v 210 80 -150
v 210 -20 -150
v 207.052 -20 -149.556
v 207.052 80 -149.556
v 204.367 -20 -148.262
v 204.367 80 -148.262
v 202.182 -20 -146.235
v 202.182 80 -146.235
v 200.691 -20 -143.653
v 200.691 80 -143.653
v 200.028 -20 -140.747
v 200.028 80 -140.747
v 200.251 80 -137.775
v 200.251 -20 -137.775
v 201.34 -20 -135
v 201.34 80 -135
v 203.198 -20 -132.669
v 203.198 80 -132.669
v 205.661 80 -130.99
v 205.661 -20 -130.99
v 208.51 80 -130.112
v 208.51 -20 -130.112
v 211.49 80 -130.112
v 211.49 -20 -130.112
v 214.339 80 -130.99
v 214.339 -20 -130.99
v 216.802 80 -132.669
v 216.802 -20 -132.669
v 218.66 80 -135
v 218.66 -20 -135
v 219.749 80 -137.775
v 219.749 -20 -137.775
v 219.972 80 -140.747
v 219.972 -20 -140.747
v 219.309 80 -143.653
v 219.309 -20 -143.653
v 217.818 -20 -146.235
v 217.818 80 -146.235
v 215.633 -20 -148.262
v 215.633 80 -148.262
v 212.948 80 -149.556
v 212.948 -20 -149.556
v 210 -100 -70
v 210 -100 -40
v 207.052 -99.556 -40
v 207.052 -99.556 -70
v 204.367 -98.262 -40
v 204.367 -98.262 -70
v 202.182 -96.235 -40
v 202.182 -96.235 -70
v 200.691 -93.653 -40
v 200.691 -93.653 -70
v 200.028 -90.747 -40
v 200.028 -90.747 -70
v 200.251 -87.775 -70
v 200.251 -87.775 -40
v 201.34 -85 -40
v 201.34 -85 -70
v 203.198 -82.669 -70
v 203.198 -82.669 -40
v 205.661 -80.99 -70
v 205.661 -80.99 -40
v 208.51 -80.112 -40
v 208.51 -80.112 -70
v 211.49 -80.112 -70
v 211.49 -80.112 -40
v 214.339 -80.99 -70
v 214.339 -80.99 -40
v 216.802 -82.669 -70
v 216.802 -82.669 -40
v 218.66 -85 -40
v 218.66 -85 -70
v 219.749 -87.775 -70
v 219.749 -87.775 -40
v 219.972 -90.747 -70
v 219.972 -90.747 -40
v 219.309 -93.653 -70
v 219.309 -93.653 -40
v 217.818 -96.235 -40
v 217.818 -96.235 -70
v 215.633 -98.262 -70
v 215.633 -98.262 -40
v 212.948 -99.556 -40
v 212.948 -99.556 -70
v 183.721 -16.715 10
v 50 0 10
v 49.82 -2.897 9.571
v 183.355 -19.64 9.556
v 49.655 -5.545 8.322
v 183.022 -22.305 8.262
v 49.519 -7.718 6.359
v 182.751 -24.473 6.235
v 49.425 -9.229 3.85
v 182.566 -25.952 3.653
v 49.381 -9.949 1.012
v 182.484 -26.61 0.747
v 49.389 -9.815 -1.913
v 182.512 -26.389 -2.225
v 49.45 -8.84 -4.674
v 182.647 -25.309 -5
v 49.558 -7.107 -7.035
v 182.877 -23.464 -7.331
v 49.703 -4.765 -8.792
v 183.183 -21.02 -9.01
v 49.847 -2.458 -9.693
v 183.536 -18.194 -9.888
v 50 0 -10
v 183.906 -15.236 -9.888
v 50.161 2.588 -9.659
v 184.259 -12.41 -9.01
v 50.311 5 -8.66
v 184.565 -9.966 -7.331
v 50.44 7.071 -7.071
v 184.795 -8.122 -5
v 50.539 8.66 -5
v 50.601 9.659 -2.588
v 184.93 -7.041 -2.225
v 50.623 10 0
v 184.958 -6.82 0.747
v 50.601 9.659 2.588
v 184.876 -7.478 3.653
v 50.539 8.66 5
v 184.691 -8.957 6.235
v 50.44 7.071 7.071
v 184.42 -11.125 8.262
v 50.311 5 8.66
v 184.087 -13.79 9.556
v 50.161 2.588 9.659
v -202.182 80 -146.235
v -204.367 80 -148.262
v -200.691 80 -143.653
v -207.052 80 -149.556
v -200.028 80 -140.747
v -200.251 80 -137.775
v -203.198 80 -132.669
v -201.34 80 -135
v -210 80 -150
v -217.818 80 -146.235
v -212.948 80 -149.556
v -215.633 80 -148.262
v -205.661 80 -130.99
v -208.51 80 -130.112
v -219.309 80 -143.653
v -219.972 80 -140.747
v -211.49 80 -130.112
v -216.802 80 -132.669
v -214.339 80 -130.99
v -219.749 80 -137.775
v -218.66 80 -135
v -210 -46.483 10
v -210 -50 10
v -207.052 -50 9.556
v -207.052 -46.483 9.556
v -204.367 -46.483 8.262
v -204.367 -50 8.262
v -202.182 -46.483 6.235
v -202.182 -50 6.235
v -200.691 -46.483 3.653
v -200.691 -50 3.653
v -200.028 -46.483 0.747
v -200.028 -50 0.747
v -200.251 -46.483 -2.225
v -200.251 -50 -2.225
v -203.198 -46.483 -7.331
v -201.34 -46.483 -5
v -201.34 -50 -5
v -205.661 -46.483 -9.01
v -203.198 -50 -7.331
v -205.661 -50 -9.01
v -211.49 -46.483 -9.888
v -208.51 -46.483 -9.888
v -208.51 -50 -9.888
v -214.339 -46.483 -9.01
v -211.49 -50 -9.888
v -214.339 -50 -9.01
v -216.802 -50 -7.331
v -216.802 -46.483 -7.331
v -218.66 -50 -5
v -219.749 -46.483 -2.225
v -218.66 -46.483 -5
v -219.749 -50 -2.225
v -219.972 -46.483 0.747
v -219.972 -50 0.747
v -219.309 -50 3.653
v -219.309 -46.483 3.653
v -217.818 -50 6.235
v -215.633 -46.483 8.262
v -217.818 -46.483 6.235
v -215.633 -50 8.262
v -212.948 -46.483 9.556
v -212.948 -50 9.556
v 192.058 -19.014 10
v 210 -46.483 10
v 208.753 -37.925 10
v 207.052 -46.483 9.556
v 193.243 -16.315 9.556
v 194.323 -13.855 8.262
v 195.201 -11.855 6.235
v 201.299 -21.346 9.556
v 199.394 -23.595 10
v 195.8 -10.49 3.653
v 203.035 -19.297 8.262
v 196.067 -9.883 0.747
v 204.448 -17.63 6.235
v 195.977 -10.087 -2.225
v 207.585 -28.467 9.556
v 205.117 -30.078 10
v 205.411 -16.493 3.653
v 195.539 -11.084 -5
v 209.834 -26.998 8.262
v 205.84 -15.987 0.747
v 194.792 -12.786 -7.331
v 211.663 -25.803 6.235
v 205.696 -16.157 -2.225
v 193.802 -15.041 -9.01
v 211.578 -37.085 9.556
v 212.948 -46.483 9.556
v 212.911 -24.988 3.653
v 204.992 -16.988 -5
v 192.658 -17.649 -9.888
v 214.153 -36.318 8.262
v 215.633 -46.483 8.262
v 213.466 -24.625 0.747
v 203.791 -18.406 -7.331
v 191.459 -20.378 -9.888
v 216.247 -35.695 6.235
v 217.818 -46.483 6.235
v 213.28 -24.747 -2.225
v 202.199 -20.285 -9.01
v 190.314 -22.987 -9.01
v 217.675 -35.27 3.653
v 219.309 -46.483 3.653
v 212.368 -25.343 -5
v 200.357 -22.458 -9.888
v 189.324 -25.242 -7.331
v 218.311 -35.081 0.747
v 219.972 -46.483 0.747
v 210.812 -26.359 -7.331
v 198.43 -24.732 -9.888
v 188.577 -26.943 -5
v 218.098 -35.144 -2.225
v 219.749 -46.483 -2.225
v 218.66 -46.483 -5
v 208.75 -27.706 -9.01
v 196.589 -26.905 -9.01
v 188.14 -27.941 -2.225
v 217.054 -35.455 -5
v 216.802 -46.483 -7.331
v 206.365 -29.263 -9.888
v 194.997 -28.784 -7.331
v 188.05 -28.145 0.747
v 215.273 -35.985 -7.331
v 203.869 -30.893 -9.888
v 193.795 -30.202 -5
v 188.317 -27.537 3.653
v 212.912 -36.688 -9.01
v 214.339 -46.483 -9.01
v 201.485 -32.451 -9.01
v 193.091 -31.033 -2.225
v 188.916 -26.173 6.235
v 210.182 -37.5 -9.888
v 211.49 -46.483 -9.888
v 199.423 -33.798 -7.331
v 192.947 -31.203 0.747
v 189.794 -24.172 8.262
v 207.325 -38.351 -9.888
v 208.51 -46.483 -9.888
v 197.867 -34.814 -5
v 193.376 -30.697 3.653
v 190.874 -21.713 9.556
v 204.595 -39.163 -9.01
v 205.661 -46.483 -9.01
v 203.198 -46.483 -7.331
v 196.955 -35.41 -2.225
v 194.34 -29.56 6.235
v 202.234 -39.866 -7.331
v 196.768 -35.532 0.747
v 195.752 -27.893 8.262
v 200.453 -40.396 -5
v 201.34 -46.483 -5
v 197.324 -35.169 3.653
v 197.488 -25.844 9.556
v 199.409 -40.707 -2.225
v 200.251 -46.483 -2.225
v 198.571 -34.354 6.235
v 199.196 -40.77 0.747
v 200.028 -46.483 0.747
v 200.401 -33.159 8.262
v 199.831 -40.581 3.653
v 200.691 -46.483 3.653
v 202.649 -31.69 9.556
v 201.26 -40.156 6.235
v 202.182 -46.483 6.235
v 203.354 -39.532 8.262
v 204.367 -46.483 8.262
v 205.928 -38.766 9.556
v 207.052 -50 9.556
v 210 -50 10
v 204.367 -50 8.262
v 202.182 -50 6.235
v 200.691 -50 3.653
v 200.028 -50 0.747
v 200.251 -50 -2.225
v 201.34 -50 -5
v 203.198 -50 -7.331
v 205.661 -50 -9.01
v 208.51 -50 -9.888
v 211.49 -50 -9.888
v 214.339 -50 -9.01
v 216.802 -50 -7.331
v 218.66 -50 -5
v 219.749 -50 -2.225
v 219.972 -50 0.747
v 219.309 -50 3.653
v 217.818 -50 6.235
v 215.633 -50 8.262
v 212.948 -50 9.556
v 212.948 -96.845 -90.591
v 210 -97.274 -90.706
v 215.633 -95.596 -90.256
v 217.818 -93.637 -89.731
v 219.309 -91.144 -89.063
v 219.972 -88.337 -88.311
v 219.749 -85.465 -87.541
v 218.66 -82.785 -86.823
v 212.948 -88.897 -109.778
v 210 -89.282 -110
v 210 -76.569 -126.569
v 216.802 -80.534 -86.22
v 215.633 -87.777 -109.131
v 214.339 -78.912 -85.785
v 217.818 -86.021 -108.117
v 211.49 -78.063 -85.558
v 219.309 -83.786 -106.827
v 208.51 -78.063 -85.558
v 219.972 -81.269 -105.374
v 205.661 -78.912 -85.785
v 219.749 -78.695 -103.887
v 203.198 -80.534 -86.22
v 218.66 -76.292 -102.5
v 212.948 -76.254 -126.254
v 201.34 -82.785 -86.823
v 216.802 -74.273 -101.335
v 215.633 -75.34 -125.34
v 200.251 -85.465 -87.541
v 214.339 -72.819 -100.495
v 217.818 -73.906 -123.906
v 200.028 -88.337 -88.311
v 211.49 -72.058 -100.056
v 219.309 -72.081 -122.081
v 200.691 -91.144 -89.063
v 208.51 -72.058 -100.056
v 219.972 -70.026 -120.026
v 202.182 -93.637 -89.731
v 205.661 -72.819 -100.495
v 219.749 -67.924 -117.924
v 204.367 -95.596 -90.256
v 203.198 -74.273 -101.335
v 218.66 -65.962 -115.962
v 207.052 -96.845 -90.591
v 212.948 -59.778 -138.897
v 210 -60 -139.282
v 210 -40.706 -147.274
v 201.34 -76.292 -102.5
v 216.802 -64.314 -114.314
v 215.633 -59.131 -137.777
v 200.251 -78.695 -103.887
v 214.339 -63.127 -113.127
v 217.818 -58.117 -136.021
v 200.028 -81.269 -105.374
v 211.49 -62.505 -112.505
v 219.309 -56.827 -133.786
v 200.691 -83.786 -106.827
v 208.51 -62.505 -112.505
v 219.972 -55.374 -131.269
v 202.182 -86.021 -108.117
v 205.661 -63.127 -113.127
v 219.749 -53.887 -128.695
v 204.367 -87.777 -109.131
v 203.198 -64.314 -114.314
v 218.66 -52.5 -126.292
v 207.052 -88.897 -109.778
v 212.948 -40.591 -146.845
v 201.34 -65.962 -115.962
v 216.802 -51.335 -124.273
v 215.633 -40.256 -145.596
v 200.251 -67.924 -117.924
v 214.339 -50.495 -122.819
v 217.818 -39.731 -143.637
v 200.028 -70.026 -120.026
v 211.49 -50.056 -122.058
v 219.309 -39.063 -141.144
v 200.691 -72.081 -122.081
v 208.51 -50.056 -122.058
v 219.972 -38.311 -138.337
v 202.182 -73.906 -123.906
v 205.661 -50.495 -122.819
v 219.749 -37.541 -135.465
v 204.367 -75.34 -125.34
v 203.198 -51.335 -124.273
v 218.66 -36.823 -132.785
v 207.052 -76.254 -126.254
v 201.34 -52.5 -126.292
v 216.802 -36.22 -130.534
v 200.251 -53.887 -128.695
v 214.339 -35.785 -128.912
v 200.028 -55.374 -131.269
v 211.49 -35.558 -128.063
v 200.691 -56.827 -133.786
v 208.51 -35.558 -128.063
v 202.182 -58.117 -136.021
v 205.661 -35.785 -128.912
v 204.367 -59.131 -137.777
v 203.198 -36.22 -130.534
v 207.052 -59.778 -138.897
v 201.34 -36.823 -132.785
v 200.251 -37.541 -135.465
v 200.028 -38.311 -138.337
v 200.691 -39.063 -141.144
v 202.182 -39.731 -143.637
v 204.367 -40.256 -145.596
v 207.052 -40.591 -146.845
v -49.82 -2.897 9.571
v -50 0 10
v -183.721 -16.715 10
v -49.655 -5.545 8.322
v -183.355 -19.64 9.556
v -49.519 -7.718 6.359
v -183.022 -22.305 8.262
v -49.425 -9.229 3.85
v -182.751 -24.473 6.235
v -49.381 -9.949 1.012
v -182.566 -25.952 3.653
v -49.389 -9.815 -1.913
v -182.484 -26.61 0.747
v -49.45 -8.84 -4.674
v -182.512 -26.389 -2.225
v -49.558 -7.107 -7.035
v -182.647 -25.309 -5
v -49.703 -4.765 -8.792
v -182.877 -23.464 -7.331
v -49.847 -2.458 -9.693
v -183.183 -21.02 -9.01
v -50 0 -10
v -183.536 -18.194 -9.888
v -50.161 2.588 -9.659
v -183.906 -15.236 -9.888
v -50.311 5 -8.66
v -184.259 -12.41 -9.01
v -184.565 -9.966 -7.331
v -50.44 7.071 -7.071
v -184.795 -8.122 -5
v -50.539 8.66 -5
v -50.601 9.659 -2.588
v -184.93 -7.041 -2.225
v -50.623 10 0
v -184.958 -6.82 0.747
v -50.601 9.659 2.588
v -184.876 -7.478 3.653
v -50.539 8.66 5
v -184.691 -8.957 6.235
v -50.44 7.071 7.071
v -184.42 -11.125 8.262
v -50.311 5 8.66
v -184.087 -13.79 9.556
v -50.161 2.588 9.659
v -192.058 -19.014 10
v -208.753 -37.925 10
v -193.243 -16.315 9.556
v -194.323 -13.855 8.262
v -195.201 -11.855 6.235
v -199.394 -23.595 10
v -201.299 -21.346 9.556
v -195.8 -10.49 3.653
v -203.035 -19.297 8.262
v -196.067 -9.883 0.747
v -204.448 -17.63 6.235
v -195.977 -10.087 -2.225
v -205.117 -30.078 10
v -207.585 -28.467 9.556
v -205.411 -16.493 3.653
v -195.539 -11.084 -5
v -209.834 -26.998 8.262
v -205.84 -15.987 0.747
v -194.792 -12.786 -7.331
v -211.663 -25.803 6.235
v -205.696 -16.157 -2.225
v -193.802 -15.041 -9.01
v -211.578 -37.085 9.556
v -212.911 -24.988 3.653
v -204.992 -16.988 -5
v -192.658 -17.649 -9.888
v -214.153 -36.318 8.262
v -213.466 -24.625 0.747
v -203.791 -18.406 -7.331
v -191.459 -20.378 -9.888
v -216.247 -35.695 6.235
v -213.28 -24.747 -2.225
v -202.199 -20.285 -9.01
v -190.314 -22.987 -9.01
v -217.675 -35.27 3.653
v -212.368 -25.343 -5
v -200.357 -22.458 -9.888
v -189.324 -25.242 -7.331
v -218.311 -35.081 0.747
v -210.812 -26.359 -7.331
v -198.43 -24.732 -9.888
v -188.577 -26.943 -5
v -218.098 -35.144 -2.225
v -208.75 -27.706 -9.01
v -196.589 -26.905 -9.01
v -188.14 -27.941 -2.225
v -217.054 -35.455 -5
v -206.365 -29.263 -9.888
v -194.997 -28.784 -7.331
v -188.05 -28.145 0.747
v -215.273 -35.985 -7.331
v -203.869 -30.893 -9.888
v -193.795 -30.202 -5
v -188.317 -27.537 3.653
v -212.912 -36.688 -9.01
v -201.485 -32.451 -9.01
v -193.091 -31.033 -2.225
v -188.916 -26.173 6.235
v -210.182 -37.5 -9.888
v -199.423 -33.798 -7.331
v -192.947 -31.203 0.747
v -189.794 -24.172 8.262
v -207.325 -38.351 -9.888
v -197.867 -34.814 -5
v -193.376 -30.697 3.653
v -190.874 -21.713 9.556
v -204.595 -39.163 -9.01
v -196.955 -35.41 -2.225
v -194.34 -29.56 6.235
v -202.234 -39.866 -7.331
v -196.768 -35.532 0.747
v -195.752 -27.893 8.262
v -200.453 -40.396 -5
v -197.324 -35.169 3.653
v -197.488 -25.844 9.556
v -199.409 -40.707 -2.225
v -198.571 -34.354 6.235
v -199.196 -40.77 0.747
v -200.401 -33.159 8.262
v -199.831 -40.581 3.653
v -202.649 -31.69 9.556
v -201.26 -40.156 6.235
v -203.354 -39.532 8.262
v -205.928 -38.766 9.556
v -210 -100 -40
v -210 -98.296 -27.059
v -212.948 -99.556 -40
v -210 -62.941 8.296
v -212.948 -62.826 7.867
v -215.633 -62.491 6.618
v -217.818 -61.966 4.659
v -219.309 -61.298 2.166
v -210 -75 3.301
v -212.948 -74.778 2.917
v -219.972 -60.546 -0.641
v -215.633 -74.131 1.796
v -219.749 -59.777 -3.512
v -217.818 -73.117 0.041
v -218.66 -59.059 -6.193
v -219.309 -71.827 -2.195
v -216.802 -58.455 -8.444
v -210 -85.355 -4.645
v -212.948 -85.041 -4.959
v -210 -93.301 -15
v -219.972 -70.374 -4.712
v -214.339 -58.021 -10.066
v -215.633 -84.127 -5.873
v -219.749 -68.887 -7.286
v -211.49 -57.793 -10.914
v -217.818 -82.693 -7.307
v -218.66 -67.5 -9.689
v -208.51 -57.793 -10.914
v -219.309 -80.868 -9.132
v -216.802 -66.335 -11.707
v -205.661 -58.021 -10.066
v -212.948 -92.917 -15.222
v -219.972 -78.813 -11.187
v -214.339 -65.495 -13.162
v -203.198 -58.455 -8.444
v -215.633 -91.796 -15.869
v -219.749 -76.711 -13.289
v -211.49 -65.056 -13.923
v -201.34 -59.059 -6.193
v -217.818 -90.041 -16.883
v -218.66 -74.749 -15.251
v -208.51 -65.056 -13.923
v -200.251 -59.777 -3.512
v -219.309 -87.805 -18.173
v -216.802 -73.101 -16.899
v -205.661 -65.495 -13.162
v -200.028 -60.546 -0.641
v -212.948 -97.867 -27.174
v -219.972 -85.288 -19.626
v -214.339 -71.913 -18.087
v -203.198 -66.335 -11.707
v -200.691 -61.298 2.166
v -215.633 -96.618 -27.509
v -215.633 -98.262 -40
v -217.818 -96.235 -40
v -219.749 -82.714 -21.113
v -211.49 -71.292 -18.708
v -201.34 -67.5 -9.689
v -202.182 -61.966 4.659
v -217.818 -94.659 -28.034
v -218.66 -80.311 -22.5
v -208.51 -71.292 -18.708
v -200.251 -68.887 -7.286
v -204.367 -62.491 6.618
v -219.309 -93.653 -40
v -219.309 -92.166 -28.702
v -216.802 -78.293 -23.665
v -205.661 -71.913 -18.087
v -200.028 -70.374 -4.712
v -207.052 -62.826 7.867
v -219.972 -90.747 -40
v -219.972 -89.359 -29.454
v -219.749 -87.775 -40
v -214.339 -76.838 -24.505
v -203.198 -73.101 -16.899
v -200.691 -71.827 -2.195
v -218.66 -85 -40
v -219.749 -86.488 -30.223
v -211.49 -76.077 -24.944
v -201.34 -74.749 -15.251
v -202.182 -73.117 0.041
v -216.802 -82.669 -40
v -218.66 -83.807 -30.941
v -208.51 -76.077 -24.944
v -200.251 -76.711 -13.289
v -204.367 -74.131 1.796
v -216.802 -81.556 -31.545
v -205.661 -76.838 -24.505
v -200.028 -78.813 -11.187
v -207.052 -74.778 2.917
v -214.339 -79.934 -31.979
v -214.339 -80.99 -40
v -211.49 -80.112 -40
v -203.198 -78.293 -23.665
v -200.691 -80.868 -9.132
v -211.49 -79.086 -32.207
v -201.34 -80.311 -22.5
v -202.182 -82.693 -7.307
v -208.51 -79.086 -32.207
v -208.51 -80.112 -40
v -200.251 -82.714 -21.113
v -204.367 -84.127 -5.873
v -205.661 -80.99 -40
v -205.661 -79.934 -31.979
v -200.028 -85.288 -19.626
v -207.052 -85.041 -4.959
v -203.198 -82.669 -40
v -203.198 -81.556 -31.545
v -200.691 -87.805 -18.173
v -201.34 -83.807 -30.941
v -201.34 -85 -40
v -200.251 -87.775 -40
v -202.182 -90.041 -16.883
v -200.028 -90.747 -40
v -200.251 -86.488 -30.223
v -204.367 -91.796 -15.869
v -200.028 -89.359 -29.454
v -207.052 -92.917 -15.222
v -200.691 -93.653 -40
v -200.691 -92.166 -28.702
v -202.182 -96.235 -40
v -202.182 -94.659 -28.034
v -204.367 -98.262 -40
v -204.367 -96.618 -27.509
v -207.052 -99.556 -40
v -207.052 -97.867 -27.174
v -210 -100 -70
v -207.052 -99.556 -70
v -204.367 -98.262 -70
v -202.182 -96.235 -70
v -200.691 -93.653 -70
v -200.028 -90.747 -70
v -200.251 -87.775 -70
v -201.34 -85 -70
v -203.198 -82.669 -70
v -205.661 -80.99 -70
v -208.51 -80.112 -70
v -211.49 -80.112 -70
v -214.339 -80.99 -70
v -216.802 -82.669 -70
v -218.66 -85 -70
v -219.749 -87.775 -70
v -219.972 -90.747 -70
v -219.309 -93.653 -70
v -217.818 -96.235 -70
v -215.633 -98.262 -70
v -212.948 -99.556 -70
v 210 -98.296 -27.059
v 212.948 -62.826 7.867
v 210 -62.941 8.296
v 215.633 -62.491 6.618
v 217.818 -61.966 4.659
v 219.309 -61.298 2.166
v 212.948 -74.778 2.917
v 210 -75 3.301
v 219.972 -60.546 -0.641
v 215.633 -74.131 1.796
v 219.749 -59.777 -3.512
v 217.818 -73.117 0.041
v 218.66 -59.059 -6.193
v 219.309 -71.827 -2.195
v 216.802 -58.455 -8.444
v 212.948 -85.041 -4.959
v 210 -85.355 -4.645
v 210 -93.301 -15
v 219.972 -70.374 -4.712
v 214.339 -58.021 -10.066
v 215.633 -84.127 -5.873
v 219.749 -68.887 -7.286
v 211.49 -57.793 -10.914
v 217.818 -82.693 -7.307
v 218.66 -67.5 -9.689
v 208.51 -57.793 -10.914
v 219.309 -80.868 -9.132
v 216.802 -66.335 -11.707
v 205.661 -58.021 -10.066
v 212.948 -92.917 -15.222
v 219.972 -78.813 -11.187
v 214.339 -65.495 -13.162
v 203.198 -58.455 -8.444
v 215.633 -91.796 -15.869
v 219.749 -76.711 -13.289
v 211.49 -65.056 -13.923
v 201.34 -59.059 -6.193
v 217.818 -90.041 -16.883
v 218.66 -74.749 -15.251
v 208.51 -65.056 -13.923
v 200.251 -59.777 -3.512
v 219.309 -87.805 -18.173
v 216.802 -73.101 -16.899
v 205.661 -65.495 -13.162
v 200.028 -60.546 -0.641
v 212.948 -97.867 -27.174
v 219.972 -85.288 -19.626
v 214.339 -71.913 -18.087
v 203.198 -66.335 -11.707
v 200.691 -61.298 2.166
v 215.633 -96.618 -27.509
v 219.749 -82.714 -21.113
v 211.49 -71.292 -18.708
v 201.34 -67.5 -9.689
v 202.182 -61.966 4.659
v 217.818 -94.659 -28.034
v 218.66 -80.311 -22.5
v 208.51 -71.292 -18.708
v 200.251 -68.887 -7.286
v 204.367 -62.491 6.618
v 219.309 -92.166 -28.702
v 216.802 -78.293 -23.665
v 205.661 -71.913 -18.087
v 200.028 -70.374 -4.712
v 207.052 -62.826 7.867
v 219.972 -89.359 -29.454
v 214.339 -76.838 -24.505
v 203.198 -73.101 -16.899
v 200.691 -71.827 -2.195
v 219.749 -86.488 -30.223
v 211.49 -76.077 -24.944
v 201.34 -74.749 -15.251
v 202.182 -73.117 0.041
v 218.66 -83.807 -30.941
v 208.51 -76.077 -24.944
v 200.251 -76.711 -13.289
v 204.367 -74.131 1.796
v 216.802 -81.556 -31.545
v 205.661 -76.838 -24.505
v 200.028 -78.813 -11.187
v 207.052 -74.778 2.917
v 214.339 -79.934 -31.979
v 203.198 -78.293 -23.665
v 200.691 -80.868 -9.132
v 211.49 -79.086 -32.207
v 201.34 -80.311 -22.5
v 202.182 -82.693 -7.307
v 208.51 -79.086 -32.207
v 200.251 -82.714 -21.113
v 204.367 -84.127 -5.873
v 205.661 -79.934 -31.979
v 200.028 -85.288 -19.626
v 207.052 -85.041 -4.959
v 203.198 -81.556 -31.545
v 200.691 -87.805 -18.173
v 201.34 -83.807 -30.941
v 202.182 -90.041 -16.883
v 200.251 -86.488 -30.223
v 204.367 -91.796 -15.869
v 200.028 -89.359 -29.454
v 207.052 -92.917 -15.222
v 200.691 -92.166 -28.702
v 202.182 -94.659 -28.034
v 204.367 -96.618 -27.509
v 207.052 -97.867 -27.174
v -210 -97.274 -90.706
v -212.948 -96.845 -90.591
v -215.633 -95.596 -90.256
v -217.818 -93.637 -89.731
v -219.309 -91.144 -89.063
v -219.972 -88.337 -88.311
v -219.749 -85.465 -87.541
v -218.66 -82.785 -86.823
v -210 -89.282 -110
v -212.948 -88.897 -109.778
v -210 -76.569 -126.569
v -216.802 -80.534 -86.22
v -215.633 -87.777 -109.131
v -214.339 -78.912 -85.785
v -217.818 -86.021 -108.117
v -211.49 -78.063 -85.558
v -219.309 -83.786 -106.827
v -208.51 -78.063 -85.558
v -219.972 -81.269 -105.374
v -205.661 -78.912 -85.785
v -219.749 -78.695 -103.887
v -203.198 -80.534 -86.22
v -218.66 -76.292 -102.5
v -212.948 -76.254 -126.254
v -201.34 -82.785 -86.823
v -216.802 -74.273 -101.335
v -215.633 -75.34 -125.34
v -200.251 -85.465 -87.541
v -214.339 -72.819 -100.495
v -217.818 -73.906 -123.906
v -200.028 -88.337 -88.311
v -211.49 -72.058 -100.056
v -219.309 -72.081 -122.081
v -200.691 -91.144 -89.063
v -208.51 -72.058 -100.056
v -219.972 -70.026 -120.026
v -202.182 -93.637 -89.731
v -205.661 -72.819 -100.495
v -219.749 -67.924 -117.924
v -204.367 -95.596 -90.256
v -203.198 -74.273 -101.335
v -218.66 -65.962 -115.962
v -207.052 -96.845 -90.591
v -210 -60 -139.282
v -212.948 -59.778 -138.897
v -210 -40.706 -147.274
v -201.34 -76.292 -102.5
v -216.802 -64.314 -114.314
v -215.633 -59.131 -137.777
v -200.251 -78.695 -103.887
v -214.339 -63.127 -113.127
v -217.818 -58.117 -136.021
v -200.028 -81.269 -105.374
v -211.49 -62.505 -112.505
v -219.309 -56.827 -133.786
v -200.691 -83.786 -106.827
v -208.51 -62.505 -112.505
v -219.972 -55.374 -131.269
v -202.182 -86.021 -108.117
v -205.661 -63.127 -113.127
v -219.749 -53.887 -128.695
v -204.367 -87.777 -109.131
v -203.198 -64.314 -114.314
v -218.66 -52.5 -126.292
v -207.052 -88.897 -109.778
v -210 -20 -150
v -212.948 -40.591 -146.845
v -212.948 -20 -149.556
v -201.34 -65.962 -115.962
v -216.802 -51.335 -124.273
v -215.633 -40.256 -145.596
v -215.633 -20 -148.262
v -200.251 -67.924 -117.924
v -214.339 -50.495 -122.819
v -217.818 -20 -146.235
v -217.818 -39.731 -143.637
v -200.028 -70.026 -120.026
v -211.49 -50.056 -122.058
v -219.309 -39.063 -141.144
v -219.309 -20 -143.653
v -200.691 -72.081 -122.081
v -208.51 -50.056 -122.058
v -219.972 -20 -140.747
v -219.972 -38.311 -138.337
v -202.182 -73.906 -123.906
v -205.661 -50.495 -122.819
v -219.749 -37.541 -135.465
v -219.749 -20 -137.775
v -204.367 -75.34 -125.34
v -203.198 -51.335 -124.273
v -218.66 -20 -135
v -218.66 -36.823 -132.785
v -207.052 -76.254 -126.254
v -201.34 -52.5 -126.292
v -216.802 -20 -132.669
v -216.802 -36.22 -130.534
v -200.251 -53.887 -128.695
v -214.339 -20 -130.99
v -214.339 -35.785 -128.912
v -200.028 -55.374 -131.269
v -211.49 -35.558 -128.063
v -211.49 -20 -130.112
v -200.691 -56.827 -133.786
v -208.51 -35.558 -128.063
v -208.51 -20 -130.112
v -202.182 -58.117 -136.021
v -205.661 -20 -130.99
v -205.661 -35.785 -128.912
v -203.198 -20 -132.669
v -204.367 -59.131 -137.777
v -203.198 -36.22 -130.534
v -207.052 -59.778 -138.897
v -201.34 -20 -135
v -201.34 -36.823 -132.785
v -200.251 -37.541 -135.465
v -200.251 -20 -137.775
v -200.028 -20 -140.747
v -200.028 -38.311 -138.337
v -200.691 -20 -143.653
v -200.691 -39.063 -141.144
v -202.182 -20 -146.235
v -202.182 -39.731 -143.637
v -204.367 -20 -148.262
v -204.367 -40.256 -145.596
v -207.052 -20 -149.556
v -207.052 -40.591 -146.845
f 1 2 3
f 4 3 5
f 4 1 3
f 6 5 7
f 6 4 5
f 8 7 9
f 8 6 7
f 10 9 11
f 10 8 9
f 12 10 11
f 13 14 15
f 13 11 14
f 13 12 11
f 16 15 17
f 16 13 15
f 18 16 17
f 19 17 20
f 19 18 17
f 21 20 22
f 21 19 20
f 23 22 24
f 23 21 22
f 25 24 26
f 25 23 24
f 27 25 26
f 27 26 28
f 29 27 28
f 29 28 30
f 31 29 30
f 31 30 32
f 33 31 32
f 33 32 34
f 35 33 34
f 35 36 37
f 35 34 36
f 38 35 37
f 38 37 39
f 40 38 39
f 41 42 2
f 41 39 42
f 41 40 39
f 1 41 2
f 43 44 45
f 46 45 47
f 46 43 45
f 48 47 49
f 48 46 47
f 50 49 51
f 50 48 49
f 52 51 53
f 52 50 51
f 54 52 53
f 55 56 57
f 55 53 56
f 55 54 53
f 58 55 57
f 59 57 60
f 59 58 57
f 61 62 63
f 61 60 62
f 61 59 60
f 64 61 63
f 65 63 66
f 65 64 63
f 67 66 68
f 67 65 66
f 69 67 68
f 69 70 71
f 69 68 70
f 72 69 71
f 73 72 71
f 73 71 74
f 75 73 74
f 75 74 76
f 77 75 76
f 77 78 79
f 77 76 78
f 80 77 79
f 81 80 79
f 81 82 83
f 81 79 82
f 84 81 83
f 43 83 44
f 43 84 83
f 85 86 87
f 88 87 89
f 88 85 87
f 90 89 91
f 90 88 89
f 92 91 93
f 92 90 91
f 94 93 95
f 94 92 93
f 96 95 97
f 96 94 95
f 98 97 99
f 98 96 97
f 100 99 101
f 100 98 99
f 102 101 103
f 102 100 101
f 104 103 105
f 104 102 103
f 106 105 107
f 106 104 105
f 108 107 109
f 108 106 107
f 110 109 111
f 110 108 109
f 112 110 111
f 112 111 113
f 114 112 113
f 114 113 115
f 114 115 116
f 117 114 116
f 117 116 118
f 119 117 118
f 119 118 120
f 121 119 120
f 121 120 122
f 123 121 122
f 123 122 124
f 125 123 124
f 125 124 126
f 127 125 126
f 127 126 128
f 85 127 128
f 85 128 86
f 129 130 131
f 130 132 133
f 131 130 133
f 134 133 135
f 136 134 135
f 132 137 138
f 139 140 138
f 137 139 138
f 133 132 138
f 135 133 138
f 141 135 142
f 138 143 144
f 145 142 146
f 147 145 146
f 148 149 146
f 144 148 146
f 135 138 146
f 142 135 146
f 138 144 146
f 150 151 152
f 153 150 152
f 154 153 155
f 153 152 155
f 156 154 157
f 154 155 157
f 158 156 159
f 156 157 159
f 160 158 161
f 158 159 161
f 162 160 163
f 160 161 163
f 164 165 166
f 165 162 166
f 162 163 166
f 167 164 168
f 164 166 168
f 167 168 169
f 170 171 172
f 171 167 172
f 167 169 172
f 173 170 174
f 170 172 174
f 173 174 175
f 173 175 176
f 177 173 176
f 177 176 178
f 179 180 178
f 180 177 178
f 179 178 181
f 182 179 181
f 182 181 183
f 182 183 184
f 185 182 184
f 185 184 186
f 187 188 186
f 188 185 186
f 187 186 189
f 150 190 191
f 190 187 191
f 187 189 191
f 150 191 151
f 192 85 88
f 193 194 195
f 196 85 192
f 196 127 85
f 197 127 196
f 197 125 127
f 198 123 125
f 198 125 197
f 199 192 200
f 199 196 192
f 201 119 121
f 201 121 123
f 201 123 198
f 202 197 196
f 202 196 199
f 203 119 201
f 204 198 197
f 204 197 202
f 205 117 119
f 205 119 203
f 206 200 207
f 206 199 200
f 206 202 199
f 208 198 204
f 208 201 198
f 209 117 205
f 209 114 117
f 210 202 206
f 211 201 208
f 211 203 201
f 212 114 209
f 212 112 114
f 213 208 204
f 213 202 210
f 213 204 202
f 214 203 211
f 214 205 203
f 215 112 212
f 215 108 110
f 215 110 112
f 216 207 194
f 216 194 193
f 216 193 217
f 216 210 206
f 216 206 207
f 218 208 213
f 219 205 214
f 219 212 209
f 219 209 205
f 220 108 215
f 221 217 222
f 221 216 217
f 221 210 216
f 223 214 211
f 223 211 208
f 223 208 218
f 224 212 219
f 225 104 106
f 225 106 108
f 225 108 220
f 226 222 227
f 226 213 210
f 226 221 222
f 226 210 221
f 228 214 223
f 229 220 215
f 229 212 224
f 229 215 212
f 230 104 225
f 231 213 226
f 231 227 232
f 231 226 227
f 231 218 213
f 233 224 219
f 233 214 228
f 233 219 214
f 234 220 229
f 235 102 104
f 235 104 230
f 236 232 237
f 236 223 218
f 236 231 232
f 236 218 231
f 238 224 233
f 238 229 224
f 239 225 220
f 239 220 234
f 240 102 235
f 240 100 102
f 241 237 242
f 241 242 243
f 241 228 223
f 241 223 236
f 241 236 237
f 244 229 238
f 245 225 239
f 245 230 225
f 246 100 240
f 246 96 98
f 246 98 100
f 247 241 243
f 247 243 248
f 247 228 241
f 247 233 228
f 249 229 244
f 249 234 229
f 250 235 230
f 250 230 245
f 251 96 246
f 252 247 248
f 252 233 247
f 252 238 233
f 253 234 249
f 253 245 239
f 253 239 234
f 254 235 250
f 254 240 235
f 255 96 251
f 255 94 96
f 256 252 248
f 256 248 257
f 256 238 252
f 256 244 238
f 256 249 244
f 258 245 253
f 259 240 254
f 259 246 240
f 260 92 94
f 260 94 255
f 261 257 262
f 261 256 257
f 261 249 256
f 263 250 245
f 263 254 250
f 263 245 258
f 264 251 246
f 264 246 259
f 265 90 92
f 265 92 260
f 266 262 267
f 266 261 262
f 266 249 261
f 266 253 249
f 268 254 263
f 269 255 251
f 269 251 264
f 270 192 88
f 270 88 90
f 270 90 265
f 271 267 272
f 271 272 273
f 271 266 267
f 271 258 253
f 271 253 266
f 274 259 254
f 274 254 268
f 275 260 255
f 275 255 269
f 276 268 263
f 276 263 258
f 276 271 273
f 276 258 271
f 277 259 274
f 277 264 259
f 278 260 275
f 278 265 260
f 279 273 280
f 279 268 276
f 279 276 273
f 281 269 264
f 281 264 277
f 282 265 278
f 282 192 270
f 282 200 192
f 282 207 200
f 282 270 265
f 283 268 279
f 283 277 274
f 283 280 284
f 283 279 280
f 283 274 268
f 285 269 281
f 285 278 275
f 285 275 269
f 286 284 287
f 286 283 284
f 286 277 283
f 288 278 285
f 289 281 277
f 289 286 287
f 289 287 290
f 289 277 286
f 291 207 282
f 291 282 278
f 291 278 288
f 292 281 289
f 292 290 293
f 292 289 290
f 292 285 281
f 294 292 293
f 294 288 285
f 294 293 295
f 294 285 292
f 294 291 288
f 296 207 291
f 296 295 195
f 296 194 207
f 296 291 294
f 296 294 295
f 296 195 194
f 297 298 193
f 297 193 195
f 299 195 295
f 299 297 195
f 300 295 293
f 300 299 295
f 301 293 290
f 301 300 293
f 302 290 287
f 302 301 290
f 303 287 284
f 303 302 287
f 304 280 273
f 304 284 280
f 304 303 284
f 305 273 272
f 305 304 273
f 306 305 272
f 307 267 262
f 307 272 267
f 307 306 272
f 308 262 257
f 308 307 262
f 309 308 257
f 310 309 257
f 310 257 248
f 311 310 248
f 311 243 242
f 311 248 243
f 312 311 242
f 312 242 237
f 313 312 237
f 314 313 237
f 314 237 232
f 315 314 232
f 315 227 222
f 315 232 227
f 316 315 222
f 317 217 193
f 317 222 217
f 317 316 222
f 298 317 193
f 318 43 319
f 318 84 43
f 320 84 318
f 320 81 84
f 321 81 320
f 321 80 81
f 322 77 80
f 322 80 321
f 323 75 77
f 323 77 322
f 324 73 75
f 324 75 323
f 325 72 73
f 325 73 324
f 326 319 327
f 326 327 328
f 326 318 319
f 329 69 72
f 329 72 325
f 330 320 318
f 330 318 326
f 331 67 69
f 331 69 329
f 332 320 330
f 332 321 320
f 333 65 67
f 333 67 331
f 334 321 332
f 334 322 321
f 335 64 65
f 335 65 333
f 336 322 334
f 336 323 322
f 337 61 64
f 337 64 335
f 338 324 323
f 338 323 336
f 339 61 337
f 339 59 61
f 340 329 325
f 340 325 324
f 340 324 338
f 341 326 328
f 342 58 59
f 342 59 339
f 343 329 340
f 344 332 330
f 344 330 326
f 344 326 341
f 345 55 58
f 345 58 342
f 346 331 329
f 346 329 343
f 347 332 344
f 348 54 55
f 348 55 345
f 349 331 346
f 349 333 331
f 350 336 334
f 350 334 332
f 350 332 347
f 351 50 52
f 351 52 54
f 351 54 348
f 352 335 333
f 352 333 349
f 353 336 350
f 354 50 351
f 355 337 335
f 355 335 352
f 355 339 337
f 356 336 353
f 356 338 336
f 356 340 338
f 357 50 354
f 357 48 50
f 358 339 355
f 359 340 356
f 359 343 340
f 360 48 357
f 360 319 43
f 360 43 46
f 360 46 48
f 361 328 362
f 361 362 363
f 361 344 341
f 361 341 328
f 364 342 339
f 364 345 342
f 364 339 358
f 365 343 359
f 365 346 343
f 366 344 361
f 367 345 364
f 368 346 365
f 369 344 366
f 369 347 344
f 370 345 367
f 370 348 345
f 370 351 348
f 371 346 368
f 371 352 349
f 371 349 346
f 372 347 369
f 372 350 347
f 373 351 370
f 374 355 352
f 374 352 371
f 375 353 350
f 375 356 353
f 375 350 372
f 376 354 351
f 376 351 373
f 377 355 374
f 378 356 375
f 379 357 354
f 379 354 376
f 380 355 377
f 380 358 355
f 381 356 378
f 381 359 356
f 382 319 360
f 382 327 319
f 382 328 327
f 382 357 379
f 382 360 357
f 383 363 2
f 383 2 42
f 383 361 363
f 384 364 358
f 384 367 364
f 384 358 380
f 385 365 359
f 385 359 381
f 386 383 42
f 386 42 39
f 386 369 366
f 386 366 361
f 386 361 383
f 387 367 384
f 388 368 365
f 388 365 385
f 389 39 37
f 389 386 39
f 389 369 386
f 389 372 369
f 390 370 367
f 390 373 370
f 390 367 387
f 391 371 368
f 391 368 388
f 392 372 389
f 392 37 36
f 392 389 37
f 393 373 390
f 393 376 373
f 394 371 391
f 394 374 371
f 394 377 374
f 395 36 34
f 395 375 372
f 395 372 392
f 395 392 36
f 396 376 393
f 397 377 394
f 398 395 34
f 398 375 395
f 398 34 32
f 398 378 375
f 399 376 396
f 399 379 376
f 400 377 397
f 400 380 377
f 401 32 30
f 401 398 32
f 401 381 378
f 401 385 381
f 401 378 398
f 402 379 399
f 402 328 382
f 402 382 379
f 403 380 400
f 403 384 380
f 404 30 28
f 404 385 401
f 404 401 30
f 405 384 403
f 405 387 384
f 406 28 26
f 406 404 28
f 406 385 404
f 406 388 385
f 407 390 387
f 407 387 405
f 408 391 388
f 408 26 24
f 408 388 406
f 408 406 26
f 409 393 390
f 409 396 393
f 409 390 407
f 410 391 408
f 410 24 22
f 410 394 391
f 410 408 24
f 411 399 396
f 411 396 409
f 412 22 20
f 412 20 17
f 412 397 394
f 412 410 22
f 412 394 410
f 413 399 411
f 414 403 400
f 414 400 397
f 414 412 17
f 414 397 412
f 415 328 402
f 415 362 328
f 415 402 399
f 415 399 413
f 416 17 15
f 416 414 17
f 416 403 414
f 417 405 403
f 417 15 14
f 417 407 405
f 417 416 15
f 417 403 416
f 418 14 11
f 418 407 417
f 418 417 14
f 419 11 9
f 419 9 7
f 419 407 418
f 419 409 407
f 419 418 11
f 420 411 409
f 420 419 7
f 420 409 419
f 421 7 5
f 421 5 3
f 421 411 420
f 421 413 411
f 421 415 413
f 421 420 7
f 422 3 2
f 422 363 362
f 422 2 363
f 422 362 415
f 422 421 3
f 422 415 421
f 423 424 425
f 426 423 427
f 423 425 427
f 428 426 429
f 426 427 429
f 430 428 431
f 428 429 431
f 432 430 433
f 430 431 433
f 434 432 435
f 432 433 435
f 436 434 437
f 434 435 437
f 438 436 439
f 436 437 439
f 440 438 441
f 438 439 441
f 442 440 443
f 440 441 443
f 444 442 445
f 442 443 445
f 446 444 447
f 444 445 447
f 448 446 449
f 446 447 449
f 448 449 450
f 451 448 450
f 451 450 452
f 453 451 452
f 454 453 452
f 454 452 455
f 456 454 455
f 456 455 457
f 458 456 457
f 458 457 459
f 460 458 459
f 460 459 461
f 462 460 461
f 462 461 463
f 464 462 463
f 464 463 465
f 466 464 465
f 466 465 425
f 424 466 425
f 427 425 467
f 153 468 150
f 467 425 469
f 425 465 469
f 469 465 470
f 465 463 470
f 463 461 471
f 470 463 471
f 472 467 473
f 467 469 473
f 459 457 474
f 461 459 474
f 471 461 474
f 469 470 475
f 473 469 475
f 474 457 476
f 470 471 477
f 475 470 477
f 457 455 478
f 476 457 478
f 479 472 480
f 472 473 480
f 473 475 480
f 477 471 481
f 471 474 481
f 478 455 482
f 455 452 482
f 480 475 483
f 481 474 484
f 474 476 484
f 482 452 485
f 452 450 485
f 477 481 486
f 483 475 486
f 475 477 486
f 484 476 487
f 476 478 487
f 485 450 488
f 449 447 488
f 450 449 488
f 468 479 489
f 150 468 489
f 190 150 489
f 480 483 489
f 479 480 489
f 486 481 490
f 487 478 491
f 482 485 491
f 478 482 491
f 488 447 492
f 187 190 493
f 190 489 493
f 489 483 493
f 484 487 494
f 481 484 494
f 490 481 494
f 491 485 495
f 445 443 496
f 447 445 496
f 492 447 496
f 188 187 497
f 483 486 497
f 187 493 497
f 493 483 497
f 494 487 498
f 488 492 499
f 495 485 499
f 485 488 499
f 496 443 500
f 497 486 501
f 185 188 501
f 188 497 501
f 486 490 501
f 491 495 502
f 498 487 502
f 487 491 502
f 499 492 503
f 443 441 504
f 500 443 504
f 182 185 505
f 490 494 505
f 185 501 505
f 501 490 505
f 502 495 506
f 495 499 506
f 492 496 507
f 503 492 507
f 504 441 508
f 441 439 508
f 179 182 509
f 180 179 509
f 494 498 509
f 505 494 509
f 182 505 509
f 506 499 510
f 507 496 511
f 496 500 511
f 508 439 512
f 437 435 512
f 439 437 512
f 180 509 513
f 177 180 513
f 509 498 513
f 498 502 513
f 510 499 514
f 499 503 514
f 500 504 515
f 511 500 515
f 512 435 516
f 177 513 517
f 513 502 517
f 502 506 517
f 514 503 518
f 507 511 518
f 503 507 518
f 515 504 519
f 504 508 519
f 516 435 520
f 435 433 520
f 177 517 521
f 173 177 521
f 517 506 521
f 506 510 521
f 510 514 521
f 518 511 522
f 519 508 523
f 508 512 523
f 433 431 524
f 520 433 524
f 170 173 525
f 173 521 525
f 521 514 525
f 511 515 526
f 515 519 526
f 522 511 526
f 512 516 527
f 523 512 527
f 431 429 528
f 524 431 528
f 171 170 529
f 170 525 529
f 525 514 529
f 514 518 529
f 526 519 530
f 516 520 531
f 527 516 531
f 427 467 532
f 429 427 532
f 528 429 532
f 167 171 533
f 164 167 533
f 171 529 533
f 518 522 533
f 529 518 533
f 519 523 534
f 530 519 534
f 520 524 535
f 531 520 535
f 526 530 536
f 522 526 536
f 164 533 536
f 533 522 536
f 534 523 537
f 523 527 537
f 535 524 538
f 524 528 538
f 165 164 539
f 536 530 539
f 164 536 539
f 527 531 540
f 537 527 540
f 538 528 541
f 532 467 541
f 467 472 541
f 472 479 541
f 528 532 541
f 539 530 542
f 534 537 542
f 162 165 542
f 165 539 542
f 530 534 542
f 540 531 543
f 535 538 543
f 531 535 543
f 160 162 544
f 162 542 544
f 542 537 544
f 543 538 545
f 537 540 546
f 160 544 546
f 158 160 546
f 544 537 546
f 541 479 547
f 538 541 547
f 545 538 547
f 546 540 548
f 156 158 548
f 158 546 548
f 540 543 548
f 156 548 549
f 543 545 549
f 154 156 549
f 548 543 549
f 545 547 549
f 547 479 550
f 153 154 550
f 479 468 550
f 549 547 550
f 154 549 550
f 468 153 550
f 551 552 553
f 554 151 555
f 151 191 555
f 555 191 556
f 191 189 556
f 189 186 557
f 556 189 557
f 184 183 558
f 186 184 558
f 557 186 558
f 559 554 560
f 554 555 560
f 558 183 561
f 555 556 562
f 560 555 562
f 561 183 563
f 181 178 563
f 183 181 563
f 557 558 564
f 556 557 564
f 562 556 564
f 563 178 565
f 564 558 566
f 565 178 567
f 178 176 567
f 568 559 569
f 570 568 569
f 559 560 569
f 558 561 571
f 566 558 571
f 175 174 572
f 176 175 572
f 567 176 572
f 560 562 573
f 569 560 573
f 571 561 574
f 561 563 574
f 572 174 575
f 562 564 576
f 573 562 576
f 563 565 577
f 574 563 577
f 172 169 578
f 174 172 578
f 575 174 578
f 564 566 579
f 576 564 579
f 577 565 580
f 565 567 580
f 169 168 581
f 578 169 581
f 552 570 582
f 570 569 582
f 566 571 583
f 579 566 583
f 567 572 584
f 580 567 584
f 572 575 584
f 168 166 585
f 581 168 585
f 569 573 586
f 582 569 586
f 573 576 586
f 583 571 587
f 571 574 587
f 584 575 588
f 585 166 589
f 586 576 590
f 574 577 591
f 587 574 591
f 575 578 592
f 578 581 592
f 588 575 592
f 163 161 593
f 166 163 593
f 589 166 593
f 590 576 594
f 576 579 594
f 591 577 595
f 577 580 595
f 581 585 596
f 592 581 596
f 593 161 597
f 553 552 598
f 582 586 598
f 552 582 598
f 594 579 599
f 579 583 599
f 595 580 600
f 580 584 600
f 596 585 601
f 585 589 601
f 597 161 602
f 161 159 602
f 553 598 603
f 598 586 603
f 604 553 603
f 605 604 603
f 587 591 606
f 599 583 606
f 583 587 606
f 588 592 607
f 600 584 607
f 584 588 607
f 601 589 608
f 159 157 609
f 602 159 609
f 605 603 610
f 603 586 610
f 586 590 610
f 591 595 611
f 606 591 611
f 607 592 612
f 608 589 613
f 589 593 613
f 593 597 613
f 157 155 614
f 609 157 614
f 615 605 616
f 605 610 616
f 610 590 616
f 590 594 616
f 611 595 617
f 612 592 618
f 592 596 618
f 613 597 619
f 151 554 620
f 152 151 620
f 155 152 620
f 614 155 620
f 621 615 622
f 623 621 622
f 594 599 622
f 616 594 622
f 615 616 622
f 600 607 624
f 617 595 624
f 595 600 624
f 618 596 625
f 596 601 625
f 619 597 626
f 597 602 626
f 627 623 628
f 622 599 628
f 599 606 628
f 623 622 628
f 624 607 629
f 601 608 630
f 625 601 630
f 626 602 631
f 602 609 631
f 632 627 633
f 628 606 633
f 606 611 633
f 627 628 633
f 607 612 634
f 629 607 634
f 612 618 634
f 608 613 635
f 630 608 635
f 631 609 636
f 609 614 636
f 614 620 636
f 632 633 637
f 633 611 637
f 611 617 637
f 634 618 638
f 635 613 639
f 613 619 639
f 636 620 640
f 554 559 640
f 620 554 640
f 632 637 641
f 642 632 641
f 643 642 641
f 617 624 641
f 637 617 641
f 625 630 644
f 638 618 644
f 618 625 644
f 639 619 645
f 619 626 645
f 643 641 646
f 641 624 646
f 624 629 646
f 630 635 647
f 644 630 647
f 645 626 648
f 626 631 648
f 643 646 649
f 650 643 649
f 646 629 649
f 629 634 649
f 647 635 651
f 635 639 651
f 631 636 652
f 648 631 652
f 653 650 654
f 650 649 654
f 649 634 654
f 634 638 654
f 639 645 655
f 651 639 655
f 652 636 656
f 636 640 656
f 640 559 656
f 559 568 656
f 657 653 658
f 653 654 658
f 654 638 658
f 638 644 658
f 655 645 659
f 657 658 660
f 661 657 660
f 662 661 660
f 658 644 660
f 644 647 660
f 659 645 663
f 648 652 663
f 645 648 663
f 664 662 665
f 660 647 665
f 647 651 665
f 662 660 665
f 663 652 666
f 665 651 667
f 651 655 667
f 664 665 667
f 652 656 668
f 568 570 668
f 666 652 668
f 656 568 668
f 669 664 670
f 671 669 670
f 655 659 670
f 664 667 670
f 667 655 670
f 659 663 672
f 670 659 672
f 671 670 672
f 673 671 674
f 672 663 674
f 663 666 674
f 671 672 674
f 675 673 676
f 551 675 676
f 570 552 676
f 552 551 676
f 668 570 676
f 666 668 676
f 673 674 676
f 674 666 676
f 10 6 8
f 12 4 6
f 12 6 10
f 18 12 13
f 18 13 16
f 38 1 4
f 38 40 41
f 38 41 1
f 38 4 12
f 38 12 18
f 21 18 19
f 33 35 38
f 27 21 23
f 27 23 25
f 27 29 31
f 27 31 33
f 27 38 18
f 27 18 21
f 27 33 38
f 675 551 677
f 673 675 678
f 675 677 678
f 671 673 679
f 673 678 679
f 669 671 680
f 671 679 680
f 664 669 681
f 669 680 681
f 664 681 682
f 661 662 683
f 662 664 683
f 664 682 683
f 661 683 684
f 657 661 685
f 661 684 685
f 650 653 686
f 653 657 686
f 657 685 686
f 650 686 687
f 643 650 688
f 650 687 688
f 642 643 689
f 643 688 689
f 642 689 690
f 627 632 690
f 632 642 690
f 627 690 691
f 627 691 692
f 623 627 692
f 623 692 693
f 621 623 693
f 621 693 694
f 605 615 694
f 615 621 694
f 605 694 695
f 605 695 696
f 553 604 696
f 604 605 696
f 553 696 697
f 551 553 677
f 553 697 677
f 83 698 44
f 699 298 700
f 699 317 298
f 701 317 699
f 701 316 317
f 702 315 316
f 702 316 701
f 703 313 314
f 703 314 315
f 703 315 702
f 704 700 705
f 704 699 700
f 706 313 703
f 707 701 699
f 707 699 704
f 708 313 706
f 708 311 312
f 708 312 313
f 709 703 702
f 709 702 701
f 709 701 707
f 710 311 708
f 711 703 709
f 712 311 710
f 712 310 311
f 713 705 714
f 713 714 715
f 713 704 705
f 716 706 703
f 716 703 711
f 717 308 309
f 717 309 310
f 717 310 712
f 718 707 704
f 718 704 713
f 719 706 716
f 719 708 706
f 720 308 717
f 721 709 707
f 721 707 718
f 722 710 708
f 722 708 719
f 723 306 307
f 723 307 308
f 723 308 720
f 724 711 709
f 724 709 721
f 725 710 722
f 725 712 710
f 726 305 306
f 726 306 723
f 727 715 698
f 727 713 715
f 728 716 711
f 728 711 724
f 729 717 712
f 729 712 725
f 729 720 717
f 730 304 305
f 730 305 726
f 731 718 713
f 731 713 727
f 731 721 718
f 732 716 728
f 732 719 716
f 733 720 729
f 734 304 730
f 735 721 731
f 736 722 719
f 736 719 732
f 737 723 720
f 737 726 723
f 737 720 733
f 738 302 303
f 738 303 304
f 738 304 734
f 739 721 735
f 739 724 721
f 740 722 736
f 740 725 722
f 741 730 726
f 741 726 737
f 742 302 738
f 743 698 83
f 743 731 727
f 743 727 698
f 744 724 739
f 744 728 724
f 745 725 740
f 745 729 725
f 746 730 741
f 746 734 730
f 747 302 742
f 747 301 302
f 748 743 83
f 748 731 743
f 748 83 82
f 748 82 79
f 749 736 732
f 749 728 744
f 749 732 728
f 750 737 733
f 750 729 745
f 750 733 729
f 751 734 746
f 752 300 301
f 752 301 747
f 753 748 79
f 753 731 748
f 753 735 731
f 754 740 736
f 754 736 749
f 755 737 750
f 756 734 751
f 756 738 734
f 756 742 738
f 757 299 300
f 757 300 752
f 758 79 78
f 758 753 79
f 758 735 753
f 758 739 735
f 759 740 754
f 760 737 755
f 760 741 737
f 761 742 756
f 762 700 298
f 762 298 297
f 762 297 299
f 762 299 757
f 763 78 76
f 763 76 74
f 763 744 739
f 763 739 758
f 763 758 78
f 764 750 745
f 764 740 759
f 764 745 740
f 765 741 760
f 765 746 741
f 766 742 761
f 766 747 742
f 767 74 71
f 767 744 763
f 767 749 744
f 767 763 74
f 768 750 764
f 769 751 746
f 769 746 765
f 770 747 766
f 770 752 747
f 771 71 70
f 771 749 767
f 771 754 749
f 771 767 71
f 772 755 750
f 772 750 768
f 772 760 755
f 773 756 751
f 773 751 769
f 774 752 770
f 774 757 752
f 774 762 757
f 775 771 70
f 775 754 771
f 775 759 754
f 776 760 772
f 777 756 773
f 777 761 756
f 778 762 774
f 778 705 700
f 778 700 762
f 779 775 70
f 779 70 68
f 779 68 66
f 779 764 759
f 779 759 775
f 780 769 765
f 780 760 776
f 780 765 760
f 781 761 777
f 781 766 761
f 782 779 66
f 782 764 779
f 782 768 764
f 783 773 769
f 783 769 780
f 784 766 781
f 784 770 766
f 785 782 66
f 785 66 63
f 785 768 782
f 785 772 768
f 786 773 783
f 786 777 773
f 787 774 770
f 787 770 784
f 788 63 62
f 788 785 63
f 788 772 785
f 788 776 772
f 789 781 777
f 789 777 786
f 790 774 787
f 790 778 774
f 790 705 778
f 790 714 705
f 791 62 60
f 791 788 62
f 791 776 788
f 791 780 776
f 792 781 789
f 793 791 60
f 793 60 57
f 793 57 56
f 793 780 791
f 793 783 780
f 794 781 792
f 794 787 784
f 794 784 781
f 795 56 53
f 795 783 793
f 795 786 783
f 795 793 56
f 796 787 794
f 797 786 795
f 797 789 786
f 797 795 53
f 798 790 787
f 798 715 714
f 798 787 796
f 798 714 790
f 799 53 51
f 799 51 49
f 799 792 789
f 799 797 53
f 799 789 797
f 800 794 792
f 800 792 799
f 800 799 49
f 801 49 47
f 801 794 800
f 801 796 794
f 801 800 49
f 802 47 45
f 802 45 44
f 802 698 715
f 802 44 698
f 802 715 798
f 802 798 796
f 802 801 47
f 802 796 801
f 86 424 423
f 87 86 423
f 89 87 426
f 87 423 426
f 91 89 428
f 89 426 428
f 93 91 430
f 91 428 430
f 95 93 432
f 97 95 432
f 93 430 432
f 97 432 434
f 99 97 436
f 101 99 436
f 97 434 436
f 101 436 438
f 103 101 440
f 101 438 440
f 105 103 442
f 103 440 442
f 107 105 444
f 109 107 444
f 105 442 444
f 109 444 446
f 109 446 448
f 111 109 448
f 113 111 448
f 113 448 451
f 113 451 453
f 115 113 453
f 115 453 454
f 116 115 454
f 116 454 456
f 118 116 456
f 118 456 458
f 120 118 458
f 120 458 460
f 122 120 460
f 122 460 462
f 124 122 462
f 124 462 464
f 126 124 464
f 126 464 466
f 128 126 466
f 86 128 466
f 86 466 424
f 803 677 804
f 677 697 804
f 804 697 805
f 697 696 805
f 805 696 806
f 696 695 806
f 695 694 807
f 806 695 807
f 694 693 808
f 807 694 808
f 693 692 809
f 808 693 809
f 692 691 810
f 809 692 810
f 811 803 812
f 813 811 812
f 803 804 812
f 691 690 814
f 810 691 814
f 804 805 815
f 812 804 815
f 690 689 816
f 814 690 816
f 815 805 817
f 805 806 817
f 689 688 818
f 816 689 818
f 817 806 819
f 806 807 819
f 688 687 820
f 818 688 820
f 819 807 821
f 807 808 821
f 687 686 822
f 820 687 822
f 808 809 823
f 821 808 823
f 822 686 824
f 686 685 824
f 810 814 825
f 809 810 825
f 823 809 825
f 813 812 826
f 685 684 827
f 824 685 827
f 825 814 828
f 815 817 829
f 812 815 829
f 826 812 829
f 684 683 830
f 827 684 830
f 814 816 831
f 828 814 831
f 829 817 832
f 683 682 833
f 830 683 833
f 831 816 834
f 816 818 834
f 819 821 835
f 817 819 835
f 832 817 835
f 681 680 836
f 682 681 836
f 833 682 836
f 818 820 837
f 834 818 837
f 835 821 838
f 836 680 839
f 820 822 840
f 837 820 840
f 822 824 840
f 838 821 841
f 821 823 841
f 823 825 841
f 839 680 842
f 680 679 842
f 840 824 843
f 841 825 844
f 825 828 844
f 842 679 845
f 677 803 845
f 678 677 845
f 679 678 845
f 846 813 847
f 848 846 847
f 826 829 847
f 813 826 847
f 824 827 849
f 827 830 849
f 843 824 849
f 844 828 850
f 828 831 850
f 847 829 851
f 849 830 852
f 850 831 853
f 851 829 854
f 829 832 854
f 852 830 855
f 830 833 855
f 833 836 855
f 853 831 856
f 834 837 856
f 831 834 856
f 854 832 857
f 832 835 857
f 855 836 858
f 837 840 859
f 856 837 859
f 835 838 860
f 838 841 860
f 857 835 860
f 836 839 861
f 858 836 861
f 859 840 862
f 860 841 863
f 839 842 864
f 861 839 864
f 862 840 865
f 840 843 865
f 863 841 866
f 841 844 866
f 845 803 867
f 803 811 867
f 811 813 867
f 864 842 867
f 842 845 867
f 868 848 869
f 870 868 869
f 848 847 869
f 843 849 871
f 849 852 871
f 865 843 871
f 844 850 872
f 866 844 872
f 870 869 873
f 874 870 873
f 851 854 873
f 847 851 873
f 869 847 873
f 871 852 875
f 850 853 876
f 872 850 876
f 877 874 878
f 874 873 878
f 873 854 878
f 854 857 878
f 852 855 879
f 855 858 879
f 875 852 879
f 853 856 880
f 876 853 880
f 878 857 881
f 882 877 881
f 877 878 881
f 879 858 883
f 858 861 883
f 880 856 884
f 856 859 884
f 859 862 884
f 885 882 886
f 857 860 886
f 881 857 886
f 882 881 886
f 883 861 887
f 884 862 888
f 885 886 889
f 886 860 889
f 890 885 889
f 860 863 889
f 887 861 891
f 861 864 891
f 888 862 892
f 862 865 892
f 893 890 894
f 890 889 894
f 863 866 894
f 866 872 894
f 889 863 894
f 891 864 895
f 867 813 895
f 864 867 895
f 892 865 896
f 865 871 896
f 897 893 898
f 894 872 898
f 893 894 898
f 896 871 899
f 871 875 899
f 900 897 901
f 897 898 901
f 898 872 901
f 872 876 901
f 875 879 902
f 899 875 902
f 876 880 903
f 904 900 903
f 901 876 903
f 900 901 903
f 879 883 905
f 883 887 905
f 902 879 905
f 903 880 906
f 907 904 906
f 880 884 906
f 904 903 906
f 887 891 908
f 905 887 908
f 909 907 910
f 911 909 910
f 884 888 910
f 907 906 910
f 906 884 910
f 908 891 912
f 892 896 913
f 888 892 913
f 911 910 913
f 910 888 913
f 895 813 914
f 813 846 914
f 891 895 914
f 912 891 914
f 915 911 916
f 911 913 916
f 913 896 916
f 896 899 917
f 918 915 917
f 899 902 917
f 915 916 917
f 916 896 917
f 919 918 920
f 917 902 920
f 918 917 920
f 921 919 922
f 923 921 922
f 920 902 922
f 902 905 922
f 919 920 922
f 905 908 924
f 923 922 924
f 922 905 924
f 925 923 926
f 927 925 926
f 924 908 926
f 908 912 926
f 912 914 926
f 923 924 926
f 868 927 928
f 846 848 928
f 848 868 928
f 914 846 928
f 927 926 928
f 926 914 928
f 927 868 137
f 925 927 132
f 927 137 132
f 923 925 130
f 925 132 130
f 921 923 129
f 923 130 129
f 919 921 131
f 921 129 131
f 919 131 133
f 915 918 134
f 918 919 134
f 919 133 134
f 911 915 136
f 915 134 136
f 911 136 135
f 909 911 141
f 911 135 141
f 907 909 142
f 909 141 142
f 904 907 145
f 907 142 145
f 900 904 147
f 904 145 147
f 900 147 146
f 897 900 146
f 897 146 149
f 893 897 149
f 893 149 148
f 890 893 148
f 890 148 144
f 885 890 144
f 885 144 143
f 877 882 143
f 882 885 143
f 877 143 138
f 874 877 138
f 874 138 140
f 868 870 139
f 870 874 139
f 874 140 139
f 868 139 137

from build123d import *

# Parameters (mm, degrees)
SWEEP1_PROFILE_R = 10


with BuildPart() as part:
    # Sweep1: sweep along a curve in space
    with BuildLine() as sweep1_path:
        Line((0, 0, 0), (50, 0, 0))
        Line((50, 0, 0), (183.721042038, -16.715130255, 0))
        ThreePointArc((183.721042038, -16.715130255, 0), (202.490345274, -26.629389659, 0), (210, -46.483466556, 0))
        Line((210, -46.483466556, 0), (210, -50, 0))
        ThreePointArc((210, -50, 0), (210, -78.284271247, -11.715728753), (210, -90, -40))
        Line((210, -90, -40), (210, -90, -70))
        ThreePointArc((210, -90, -70), (210, -69.497474683, -119.497474683), (210, -20, -140))
        Line((210, -20, -140), (210, 80, -140))
    # Sweep1 profile (on start of the path) → Sweep1 (sweep)
    with BuildSketch(Plane(origin=(0, 0, 0), x_dir=(0, 0, 1), z_dir=(1, 0, 0))):
        Circle(SWEEP1_PROFILE_R)
    sweep1 = sweep(path=sweep1_path.line, transition=Transition.RIGHT)

    # Mirror1: Sweep1 across plane
    add(sweep1.mirror(Plane.ZY))


solid = part.part
